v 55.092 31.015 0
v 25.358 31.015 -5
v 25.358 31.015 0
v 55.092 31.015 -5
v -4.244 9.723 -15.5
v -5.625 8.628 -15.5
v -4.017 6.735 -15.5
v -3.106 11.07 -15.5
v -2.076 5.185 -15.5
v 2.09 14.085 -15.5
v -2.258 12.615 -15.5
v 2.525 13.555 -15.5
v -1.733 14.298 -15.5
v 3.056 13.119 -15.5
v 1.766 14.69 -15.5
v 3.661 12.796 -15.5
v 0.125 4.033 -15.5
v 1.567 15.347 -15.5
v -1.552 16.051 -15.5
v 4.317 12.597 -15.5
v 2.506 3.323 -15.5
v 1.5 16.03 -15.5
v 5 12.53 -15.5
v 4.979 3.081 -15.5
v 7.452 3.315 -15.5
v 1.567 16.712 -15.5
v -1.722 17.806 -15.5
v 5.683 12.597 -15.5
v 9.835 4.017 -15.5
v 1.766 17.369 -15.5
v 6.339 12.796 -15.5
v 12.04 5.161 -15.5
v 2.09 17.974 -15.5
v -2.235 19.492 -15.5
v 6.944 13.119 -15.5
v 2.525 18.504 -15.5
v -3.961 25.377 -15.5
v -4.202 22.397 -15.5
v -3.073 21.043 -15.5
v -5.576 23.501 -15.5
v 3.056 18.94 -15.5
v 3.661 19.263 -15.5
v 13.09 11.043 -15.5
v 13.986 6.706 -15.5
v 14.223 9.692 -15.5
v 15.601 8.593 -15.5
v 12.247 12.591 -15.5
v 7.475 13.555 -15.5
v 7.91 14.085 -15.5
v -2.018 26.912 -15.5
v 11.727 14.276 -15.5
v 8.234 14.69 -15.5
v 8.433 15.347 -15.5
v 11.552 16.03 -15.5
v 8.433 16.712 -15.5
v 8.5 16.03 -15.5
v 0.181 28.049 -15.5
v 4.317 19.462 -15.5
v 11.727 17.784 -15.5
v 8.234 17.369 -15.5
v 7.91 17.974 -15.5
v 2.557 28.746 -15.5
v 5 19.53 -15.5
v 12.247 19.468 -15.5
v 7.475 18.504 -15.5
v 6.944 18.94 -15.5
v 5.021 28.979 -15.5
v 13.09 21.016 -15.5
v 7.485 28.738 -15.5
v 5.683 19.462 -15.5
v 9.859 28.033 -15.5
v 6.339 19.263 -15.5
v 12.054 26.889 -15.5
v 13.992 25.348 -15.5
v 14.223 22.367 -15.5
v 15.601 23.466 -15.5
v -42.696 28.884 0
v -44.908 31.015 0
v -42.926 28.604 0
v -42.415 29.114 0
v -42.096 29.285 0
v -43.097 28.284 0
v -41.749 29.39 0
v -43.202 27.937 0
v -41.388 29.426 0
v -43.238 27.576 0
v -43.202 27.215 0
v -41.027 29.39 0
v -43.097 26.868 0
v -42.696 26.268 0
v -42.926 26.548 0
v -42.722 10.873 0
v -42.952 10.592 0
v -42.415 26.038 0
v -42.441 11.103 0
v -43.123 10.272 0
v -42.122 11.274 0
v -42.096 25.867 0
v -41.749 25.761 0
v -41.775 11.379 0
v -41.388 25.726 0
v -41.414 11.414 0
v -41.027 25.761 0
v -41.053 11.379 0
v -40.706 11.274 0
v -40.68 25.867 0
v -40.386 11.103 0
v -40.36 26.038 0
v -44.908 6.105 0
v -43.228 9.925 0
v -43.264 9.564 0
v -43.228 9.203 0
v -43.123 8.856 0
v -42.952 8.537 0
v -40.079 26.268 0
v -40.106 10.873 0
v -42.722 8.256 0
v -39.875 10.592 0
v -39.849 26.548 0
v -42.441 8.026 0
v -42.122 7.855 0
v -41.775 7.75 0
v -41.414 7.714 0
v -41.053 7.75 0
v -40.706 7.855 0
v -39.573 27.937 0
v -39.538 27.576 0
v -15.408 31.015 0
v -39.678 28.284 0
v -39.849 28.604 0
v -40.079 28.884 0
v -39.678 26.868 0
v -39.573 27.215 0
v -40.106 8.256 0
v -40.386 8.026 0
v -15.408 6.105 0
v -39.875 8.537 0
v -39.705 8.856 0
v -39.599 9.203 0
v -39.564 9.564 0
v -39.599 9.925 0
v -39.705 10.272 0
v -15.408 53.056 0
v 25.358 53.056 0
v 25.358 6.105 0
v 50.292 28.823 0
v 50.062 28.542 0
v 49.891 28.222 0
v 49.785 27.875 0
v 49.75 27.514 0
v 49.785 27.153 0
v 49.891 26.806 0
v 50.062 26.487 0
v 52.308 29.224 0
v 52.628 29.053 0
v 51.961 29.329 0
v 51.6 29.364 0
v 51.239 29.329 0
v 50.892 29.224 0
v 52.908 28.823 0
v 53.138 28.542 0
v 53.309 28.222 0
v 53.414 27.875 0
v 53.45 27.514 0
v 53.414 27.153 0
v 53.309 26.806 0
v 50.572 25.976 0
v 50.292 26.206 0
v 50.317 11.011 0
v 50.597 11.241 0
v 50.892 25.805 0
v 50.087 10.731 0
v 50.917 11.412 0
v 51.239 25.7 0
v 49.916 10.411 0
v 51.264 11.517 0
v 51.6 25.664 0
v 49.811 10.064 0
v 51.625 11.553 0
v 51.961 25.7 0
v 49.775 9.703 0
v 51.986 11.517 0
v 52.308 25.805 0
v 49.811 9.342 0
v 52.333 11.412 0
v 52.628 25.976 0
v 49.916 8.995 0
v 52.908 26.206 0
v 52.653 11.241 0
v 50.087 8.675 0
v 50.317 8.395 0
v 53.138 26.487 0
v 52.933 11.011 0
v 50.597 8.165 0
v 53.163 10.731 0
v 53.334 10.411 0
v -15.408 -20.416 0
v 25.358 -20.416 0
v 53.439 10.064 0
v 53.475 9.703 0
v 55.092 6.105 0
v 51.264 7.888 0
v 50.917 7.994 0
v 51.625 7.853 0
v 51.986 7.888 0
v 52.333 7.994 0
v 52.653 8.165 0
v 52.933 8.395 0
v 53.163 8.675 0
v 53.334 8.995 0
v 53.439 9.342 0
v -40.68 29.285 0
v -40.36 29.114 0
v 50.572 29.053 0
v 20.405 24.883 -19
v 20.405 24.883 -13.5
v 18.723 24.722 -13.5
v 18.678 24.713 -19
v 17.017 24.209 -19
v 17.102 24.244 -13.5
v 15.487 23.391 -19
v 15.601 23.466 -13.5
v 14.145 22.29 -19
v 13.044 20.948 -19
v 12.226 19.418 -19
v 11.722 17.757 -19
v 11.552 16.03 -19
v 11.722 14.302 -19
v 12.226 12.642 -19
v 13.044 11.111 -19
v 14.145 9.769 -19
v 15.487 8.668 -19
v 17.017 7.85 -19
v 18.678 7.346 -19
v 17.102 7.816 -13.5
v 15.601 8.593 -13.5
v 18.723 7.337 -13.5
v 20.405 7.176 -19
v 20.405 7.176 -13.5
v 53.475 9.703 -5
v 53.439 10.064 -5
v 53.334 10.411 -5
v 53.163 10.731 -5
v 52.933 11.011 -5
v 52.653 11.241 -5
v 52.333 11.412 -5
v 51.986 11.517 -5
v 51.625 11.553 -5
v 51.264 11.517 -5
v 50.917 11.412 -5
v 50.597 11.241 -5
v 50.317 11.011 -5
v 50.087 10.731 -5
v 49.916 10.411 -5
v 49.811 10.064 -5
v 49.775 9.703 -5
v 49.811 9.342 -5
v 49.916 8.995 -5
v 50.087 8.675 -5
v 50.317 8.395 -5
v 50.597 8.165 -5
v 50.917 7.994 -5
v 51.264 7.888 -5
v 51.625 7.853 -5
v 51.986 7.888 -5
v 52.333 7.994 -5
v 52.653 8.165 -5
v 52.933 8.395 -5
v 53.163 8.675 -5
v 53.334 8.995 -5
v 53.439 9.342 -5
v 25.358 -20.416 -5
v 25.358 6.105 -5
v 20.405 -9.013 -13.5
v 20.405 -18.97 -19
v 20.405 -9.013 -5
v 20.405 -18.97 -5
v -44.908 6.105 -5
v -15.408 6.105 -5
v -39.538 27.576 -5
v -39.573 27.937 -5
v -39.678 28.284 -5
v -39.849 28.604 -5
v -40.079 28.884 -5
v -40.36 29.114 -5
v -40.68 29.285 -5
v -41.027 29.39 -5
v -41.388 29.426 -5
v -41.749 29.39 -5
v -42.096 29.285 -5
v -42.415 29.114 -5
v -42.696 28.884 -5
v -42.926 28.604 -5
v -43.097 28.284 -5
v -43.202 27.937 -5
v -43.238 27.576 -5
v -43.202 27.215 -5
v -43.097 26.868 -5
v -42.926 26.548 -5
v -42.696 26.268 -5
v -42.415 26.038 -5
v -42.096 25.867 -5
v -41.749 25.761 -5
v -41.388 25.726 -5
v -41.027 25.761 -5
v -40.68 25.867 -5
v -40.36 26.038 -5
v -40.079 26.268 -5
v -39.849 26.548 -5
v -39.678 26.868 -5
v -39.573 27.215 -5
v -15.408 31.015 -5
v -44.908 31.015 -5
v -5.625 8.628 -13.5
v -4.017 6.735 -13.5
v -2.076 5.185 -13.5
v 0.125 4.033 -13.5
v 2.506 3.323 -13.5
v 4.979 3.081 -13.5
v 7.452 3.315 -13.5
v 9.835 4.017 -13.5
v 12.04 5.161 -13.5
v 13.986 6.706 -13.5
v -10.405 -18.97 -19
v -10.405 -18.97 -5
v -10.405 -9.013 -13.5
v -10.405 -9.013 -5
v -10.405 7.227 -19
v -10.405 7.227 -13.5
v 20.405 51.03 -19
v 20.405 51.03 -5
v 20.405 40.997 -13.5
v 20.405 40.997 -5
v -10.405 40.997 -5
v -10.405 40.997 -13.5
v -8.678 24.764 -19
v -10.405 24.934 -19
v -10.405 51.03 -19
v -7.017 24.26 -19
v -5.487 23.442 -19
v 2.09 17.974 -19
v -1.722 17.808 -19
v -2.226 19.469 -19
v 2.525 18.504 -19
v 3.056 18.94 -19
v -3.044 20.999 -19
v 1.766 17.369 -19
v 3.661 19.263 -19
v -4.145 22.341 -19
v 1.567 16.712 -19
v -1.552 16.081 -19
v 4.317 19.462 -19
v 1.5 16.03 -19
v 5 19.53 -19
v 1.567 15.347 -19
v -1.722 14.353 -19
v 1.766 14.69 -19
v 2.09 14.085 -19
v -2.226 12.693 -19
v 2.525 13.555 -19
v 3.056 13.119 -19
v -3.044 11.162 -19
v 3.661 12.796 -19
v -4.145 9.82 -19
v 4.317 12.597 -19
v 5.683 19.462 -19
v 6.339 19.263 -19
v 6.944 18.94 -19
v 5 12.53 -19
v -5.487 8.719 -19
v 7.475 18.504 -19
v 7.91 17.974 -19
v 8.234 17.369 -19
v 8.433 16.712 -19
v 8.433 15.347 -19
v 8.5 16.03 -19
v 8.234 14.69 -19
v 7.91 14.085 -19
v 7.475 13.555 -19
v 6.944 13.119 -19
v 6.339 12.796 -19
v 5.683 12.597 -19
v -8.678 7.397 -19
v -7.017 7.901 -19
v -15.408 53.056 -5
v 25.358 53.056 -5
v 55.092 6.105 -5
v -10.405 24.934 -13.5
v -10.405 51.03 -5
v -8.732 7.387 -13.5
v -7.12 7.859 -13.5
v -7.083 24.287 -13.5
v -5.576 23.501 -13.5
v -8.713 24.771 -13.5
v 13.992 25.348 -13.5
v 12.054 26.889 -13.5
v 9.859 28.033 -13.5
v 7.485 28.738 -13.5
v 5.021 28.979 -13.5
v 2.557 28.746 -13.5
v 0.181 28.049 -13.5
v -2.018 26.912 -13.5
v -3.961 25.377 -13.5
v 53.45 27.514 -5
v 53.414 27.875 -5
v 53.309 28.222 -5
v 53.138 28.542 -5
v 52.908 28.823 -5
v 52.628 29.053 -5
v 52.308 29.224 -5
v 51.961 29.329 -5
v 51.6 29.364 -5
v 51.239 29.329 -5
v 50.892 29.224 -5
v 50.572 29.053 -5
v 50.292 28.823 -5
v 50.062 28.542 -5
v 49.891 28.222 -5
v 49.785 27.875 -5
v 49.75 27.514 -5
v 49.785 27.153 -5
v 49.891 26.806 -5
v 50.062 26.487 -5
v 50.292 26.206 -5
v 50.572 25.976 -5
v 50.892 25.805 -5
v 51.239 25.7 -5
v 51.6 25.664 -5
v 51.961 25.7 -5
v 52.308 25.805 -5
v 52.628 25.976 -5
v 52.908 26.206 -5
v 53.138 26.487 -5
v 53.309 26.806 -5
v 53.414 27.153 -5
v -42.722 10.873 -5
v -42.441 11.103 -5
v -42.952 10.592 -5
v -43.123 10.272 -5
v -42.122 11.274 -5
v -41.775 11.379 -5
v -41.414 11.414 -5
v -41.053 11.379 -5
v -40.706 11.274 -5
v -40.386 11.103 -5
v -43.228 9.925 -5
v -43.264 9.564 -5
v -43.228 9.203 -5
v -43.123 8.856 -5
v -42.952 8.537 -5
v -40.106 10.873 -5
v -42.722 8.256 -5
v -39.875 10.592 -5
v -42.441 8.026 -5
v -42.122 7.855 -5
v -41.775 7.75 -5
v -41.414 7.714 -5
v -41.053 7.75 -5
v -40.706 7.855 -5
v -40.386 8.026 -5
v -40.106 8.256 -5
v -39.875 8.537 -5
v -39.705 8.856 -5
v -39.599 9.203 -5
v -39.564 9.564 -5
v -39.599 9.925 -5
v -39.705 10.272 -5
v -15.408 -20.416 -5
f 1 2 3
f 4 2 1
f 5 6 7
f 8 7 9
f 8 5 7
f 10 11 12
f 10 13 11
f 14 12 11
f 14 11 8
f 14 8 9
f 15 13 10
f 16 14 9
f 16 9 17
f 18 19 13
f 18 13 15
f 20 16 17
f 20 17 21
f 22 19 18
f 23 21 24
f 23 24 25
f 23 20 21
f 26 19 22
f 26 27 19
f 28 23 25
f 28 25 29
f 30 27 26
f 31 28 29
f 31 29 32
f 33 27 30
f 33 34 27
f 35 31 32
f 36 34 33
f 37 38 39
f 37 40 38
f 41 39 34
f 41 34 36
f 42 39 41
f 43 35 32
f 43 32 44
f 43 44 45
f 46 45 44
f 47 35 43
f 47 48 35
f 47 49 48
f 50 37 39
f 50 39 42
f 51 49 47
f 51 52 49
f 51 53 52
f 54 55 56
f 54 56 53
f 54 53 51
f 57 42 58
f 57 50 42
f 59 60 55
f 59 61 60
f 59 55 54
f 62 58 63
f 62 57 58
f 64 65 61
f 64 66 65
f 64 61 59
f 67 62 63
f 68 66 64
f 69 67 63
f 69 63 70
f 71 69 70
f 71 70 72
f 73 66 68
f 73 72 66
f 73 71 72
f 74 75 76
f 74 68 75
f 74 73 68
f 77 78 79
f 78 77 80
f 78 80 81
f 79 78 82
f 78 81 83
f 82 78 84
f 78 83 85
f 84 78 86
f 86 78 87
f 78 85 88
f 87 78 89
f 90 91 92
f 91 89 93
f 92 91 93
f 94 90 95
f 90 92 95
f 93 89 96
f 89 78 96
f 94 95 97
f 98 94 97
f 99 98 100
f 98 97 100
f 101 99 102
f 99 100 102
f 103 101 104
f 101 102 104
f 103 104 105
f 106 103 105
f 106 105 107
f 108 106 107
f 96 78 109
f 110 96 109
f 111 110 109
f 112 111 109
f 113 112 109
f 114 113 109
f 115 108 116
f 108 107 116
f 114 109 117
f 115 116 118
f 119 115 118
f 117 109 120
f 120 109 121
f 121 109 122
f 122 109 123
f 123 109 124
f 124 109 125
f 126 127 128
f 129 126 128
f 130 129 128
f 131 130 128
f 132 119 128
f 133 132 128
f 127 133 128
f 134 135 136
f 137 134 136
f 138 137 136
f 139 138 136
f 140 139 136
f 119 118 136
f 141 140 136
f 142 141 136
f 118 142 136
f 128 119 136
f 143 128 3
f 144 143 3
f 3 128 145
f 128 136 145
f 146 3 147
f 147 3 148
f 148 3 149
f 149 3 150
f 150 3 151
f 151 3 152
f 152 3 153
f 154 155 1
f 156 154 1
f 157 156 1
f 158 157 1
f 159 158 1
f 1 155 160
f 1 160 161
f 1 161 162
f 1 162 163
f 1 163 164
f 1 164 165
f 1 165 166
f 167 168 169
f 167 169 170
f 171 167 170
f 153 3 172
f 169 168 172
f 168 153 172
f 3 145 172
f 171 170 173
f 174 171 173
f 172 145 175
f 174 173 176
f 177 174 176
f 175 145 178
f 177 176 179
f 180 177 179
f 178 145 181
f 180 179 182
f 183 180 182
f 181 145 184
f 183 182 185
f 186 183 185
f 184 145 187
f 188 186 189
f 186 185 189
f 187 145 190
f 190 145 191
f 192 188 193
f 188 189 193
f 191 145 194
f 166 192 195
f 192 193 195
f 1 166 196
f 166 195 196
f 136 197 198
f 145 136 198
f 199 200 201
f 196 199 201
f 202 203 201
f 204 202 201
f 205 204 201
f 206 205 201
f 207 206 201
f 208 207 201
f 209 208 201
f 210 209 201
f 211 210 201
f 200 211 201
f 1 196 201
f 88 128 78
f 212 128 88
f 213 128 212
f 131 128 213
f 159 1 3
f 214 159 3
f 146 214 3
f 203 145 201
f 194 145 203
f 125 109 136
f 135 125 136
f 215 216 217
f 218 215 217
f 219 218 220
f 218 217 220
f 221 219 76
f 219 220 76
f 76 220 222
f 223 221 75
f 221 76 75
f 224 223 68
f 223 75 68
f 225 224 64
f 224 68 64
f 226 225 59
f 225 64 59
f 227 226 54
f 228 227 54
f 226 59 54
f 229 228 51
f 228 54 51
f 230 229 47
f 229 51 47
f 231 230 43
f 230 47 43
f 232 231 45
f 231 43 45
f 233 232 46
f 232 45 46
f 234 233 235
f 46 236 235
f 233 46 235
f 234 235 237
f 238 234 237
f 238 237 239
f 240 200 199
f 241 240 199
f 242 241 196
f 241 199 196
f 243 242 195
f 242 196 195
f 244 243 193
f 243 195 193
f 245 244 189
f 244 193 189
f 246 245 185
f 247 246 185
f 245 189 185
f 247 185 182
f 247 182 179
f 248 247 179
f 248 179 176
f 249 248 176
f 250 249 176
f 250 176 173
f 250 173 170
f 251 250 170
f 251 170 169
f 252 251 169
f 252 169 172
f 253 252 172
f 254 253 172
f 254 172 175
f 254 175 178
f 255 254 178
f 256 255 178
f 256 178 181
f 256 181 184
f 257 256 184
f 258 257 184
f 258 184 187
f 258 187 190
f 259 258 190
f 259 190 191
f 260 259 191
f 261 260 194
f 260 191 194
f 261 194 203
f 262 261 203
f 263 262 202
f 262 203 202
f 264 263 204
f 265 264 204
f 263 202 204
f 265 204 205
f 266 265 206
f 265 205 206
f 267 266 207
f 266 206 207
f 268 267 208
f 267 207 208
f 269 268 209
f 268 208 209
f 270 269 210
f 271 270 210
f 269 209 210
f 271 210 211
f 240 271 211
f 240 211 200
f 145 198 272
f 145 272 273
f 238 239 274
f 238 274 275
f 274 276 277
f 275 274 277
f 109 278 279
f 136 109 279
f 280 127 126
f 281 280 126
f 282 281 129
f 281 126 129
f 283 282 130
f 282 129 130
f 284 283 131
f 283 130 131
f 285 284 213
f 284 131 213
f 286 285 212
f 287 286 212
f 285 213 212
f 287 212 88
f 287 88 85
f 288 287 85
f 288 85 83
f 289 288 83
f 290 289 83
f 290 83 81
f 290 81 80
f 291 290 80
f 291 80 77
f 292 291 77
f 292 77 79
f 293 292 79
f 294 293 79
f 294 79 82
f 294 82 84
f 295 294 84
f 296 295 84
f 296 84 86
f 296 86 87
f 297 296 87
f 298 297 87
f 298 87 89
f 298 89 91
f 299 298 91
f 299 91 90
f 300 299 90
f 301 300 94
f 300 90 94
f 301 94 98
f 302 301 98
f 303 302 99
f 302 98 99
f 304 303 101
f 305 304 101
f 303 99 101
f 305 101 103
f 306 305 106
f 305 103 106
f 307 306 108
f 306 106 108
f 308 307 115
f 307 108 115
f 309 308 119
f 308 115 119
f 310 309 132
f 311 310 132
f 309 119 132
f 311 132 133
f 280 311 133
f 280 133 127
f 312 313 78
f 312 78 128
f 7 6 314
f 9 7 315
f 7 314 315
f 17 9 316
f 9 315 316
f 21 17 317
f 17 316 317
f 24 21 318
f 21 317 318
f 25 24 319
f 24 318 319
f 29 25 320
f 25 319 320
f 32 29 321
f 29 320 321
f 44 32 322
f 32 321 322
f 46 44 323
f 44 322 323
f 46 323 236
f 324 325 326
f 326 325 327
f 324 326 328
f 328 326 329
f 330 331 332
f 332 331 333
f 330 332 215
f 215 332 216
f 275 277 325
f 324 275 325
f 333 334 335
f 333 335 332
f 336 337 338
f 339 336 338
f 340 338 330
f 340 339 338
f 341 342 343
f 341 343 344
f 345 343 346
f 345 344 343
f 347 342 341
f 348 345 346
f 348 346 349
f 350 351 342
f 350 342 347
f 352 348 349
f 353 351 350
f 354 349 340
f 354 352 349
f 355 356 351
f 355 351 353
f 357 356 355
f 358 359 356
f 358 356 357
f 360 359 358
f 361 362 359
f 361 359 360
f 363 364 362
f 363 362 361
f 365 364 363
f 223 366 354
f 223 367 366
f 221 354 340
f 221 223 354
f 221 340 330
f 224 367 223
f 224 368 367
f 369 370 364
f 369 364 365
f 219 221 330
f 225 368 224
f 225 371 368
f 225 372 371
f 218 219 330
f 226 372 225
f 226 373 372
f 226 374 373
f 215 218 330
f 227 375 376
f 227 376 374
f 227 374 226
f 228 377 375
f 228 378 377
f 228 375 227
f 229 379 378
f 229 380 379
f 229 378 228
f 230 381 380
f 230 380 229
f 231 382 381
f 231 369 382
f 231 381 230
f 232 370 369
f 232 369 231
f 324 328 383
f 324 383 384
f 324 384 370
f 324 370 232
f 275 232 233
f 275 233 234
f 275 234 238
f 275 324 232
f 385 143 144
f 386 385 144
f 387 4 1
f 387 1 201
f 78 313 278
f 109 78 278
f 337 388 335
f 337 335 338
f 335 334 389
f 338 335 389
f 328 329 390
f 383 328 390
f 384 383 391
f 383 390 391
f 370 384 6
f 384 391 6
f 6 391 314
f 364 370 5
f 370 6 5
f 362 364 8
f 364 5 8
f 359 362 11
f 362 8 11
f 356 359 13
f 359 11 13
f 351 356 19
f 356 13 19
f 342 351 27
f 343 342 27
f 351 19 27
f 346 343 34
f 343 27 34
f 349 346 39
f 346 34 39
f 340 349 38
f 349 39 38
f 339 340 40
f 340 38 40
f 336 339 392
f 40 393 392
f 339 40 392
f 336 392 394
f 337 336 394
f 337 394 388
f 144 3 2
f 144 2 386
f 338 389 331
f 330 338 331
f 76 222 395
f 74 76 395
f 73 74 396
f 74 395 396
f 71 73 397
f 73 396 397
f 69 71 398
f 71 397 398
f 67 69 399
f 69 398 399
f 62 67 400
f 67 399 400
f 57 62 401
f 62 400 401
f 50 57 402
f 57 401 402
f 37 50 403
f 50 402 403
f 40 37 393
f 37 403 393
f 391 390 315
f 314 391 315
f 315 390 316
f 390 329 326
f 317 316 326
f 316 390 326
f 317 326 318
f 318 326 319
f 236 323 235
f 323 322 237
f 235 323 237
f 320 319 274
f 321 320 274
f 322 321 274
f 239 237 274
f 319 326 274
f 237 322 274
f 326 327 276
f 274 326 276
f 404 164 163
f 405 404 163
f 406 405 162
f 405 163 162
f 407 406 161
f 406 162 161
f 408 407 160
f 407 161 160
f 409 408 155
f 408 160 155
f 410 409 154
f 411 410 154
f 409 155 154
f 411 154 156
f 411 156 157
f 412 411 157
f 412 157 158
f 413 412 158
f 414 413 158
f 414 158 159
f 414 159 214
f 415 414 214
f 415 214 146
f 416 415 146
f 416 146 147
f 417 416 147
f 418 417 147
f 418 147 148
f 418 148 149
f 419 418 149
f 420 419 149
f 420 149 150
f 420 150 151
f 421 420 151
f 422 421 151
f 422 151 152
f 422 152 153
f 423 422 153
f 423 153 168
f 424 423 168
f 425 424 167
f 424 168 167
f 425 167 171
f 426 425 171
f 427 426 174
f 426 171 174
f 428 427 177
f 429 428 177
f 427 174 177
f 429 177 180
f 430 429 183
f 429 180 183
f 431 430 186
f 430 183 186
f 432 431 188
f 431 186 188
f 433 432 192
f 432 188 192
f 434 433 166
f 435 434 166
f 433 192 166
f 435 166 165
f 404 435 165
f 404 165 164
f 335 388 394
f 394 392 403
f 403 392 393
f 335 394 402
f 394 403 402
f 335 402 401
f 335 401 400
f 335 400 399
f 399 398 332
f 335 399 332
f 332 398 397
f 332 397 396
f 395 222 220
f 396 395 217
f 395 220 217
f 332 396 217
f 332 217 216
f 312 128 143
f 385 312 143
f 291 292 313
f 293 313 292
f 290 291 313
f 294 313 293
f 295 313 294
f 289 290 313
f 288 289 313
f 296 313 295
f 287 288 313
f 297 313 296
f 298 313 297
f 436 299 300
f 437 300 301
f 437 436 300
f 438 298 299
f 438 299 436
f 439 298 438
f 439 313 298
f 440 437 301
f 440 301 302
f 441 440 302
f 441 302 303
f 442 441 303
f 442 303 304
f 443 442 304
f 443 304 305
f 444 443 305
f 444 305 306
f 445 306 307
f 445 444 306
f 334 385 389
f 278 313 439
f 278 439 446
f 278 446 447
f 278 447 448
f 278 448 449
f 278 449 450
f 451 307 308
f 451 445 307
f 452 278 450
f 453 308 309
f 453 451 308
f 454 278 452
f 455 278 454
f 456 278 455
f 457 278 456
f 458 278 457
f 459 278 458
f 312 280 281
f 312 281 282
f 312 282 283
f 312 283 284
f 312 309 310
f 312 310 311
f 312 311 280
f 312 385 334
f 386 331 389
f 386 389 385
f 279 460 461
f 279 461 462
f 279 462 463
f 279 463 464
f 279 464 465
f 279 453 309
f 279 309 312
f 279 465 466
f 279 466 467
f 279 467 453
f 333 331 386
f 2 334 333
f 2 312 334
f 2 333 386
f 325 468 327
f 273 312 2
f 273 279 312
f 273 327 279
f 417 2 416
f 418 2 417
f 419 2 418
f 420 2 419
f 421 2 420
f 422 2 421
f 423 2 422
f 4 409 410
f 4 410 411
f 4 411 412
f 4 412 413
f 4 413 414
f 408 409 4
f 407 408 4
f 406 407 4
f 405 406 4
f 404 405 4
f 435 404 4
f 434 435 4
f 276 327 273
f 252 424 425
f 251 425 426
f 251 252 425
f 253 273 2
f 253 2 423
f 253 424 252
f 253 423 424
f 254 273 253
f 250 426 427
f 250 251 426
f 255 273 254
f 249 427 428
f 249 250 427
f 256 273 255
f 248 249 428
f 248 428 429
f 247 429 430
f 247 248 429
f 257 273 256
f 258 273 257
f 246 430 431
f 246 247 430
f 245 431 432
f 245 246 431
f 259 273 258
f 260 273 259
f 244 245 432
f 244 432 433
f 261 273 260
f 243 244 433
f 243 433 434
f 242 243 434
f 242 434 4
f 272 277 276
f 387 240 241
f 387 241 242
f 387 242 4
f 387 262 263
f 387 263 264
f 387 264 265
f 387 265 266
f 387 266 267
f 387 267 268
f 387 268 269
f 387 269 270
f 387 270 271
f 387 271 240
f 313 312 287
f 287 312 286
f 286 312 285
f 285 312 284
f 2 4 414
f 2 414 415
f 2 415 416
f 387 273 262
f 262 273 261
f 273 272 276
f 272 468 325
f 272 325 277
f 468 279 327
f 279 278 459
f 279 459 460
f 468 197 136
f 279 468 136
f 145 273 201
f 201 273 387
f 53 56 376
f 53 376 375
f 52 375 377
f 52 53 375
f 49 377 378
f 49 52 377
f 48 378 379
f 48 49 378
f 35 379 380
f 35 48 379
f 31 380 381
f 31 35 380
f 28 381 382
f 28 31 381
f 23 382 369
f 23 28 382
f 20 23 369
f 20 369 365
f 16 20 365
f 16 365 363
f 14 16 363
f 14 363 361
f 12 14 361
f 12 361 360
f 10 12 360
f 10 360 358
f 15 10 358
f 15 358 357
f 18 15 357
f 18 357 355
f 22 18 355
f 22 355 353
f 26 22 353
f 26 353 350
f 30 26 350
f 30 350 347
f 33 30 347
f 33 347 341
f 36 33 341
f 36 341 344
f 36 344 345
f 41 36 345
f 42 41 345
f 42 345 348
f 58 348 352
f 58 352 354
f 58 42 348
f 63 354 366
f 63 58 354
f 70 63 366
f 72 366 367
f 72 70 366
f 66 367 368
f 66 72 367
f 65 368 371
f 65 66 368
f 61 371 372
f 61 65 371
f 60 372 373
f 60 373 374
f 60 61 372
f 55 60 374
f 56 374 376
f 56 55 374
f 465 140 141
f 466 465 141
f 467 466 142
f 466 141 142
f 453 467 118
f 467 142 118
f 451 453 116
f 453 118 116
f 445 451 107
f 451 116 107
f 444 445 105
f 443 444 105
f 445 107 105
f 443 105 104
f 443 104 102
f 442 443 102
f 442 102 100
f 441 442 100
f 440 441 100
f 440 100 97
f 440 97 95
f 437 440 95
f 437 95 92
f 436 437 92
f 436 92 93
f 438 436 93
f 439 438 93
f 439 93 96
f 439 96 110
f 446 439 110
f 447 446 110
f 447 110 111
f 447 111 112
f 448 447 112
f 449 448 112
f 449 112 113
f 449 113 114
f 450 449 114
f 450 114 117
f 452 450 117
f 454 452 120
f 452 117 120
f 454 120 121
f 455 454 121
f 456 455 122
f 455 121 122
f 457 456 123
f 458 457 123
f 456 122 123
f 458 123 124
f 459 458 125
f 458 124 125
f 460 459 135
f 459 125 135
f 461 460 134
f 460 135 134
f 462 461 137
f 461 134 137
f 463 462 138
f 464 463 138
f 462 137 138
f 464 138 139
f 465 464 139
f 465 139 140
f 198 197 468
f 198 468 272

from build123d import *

# Parameters (mm, degrees)
F0_W      = 40.765519
F0_H      = 73.471674
F1_DEPTH  = 5
F2_R      = 3.5
F3_DEPTH  = 14
F4_W      = 35
F4_H      = 50.010137
F5_DEPTH  = 8.5
F6_W      = 100
F6_H      = 24.910029
F7_DEPTH  = 5
F8_R      = 1.85
F9_DEPTH  = 25.4
F10_R     = 12.94909
F11_DEPTH = 2


with BuildPart() as f1:
    # F0 (on Top) → F1 (new body)
    with BuildSketch(Plane.XY):
        with Locations((4.975075, 16.320152)):
            Rectangle(F0_W, F0_H)
    extrude(amount=-F1_DEPTH)

    # F2 (on face) → F3 (join)
    with BuildSketch(Plane(origin=(0, 0, -5), x_dir=(1, 0, 0), z_dir=(0, 0, -1))):
        with BuildLine():
            Line((20.405405, 18.970378), (-10.405405, 18.970378))
            Line((-10.405405, 18.970378), (-10.405405, -7.227108))
            ThreePointArc((-10.405405, -7.227108), (-1.55183, -16.080683), (-10.405405, -24.934258))
            Line((-10.405405, -24.934258), (-10.405405, -51.029622))
            Line((-10.405405, -51.029622), (20.405405, -51.029622))
            Line((20.405405, -51.029622), (20.405405, -24.883203))
            ThreePointArc((20.405405, -24.883203), (11.551825, -16.029622), (20.405405, -7.176042))
            Line((20.405405, -7.176042), (20.405405, 18.970378))
        make_face()
        with Locations((5, -16.029622)):
            Circle(F2_R, mode=Mode.SUBTRACT)
    extrude(amount=F3_DEPTH)

    # F4 (on face) → F5 (cut)
    with BuildSketch(Plane(origin=(0, 0, -5), x_dir=(1, 0, 0), z_dir=(0, 0, -1))):
        with Locations((2.905405, -15.991903)):
            Rectangle(F4_W, F4_H)
    extrude(amount=F5_DEPTH, mode=Mode.SUBTRACT)

    # F6 (on face) → F7 (join)
    with BuildSketch(Plane(origin=(0, 0, -5), x_dir=(1, 0, 0), z_dir=(0, 0, -1))):
        with Locations((5.092296, -18.559826)):
            Rectangle(F6_W, F6_H)
    extrude(amount=-F7_DEPTH)

    # F8 (on face) → F9 (cut)
    with BuildSketch(Plane.XY):
        with Locations((-41.387634, 27.575926)):
            Circle(F8_R)
        with Locations((51.599746, 27.514396)):
            Circle(F8_R)
        with Locations((-41.413683, 9.564399)):
            Circle(F8_R)
        with Locations((51.624972, 9.70294)):
            Circle(F8_R)
    extrude(amount=-F9_DEPTH, mode=Mode.SUBTRACT)

    # F10 (on face) → F11 (cut)
    with BuildSketch(Plane.XY.offset(-13.5)):
        with Locations((5, 16.029622)):
            Circle(F10_R)
    extrude(amount=-F11_DEPTH, mode=Mode.SUBTRACT)


solid = f1.part
